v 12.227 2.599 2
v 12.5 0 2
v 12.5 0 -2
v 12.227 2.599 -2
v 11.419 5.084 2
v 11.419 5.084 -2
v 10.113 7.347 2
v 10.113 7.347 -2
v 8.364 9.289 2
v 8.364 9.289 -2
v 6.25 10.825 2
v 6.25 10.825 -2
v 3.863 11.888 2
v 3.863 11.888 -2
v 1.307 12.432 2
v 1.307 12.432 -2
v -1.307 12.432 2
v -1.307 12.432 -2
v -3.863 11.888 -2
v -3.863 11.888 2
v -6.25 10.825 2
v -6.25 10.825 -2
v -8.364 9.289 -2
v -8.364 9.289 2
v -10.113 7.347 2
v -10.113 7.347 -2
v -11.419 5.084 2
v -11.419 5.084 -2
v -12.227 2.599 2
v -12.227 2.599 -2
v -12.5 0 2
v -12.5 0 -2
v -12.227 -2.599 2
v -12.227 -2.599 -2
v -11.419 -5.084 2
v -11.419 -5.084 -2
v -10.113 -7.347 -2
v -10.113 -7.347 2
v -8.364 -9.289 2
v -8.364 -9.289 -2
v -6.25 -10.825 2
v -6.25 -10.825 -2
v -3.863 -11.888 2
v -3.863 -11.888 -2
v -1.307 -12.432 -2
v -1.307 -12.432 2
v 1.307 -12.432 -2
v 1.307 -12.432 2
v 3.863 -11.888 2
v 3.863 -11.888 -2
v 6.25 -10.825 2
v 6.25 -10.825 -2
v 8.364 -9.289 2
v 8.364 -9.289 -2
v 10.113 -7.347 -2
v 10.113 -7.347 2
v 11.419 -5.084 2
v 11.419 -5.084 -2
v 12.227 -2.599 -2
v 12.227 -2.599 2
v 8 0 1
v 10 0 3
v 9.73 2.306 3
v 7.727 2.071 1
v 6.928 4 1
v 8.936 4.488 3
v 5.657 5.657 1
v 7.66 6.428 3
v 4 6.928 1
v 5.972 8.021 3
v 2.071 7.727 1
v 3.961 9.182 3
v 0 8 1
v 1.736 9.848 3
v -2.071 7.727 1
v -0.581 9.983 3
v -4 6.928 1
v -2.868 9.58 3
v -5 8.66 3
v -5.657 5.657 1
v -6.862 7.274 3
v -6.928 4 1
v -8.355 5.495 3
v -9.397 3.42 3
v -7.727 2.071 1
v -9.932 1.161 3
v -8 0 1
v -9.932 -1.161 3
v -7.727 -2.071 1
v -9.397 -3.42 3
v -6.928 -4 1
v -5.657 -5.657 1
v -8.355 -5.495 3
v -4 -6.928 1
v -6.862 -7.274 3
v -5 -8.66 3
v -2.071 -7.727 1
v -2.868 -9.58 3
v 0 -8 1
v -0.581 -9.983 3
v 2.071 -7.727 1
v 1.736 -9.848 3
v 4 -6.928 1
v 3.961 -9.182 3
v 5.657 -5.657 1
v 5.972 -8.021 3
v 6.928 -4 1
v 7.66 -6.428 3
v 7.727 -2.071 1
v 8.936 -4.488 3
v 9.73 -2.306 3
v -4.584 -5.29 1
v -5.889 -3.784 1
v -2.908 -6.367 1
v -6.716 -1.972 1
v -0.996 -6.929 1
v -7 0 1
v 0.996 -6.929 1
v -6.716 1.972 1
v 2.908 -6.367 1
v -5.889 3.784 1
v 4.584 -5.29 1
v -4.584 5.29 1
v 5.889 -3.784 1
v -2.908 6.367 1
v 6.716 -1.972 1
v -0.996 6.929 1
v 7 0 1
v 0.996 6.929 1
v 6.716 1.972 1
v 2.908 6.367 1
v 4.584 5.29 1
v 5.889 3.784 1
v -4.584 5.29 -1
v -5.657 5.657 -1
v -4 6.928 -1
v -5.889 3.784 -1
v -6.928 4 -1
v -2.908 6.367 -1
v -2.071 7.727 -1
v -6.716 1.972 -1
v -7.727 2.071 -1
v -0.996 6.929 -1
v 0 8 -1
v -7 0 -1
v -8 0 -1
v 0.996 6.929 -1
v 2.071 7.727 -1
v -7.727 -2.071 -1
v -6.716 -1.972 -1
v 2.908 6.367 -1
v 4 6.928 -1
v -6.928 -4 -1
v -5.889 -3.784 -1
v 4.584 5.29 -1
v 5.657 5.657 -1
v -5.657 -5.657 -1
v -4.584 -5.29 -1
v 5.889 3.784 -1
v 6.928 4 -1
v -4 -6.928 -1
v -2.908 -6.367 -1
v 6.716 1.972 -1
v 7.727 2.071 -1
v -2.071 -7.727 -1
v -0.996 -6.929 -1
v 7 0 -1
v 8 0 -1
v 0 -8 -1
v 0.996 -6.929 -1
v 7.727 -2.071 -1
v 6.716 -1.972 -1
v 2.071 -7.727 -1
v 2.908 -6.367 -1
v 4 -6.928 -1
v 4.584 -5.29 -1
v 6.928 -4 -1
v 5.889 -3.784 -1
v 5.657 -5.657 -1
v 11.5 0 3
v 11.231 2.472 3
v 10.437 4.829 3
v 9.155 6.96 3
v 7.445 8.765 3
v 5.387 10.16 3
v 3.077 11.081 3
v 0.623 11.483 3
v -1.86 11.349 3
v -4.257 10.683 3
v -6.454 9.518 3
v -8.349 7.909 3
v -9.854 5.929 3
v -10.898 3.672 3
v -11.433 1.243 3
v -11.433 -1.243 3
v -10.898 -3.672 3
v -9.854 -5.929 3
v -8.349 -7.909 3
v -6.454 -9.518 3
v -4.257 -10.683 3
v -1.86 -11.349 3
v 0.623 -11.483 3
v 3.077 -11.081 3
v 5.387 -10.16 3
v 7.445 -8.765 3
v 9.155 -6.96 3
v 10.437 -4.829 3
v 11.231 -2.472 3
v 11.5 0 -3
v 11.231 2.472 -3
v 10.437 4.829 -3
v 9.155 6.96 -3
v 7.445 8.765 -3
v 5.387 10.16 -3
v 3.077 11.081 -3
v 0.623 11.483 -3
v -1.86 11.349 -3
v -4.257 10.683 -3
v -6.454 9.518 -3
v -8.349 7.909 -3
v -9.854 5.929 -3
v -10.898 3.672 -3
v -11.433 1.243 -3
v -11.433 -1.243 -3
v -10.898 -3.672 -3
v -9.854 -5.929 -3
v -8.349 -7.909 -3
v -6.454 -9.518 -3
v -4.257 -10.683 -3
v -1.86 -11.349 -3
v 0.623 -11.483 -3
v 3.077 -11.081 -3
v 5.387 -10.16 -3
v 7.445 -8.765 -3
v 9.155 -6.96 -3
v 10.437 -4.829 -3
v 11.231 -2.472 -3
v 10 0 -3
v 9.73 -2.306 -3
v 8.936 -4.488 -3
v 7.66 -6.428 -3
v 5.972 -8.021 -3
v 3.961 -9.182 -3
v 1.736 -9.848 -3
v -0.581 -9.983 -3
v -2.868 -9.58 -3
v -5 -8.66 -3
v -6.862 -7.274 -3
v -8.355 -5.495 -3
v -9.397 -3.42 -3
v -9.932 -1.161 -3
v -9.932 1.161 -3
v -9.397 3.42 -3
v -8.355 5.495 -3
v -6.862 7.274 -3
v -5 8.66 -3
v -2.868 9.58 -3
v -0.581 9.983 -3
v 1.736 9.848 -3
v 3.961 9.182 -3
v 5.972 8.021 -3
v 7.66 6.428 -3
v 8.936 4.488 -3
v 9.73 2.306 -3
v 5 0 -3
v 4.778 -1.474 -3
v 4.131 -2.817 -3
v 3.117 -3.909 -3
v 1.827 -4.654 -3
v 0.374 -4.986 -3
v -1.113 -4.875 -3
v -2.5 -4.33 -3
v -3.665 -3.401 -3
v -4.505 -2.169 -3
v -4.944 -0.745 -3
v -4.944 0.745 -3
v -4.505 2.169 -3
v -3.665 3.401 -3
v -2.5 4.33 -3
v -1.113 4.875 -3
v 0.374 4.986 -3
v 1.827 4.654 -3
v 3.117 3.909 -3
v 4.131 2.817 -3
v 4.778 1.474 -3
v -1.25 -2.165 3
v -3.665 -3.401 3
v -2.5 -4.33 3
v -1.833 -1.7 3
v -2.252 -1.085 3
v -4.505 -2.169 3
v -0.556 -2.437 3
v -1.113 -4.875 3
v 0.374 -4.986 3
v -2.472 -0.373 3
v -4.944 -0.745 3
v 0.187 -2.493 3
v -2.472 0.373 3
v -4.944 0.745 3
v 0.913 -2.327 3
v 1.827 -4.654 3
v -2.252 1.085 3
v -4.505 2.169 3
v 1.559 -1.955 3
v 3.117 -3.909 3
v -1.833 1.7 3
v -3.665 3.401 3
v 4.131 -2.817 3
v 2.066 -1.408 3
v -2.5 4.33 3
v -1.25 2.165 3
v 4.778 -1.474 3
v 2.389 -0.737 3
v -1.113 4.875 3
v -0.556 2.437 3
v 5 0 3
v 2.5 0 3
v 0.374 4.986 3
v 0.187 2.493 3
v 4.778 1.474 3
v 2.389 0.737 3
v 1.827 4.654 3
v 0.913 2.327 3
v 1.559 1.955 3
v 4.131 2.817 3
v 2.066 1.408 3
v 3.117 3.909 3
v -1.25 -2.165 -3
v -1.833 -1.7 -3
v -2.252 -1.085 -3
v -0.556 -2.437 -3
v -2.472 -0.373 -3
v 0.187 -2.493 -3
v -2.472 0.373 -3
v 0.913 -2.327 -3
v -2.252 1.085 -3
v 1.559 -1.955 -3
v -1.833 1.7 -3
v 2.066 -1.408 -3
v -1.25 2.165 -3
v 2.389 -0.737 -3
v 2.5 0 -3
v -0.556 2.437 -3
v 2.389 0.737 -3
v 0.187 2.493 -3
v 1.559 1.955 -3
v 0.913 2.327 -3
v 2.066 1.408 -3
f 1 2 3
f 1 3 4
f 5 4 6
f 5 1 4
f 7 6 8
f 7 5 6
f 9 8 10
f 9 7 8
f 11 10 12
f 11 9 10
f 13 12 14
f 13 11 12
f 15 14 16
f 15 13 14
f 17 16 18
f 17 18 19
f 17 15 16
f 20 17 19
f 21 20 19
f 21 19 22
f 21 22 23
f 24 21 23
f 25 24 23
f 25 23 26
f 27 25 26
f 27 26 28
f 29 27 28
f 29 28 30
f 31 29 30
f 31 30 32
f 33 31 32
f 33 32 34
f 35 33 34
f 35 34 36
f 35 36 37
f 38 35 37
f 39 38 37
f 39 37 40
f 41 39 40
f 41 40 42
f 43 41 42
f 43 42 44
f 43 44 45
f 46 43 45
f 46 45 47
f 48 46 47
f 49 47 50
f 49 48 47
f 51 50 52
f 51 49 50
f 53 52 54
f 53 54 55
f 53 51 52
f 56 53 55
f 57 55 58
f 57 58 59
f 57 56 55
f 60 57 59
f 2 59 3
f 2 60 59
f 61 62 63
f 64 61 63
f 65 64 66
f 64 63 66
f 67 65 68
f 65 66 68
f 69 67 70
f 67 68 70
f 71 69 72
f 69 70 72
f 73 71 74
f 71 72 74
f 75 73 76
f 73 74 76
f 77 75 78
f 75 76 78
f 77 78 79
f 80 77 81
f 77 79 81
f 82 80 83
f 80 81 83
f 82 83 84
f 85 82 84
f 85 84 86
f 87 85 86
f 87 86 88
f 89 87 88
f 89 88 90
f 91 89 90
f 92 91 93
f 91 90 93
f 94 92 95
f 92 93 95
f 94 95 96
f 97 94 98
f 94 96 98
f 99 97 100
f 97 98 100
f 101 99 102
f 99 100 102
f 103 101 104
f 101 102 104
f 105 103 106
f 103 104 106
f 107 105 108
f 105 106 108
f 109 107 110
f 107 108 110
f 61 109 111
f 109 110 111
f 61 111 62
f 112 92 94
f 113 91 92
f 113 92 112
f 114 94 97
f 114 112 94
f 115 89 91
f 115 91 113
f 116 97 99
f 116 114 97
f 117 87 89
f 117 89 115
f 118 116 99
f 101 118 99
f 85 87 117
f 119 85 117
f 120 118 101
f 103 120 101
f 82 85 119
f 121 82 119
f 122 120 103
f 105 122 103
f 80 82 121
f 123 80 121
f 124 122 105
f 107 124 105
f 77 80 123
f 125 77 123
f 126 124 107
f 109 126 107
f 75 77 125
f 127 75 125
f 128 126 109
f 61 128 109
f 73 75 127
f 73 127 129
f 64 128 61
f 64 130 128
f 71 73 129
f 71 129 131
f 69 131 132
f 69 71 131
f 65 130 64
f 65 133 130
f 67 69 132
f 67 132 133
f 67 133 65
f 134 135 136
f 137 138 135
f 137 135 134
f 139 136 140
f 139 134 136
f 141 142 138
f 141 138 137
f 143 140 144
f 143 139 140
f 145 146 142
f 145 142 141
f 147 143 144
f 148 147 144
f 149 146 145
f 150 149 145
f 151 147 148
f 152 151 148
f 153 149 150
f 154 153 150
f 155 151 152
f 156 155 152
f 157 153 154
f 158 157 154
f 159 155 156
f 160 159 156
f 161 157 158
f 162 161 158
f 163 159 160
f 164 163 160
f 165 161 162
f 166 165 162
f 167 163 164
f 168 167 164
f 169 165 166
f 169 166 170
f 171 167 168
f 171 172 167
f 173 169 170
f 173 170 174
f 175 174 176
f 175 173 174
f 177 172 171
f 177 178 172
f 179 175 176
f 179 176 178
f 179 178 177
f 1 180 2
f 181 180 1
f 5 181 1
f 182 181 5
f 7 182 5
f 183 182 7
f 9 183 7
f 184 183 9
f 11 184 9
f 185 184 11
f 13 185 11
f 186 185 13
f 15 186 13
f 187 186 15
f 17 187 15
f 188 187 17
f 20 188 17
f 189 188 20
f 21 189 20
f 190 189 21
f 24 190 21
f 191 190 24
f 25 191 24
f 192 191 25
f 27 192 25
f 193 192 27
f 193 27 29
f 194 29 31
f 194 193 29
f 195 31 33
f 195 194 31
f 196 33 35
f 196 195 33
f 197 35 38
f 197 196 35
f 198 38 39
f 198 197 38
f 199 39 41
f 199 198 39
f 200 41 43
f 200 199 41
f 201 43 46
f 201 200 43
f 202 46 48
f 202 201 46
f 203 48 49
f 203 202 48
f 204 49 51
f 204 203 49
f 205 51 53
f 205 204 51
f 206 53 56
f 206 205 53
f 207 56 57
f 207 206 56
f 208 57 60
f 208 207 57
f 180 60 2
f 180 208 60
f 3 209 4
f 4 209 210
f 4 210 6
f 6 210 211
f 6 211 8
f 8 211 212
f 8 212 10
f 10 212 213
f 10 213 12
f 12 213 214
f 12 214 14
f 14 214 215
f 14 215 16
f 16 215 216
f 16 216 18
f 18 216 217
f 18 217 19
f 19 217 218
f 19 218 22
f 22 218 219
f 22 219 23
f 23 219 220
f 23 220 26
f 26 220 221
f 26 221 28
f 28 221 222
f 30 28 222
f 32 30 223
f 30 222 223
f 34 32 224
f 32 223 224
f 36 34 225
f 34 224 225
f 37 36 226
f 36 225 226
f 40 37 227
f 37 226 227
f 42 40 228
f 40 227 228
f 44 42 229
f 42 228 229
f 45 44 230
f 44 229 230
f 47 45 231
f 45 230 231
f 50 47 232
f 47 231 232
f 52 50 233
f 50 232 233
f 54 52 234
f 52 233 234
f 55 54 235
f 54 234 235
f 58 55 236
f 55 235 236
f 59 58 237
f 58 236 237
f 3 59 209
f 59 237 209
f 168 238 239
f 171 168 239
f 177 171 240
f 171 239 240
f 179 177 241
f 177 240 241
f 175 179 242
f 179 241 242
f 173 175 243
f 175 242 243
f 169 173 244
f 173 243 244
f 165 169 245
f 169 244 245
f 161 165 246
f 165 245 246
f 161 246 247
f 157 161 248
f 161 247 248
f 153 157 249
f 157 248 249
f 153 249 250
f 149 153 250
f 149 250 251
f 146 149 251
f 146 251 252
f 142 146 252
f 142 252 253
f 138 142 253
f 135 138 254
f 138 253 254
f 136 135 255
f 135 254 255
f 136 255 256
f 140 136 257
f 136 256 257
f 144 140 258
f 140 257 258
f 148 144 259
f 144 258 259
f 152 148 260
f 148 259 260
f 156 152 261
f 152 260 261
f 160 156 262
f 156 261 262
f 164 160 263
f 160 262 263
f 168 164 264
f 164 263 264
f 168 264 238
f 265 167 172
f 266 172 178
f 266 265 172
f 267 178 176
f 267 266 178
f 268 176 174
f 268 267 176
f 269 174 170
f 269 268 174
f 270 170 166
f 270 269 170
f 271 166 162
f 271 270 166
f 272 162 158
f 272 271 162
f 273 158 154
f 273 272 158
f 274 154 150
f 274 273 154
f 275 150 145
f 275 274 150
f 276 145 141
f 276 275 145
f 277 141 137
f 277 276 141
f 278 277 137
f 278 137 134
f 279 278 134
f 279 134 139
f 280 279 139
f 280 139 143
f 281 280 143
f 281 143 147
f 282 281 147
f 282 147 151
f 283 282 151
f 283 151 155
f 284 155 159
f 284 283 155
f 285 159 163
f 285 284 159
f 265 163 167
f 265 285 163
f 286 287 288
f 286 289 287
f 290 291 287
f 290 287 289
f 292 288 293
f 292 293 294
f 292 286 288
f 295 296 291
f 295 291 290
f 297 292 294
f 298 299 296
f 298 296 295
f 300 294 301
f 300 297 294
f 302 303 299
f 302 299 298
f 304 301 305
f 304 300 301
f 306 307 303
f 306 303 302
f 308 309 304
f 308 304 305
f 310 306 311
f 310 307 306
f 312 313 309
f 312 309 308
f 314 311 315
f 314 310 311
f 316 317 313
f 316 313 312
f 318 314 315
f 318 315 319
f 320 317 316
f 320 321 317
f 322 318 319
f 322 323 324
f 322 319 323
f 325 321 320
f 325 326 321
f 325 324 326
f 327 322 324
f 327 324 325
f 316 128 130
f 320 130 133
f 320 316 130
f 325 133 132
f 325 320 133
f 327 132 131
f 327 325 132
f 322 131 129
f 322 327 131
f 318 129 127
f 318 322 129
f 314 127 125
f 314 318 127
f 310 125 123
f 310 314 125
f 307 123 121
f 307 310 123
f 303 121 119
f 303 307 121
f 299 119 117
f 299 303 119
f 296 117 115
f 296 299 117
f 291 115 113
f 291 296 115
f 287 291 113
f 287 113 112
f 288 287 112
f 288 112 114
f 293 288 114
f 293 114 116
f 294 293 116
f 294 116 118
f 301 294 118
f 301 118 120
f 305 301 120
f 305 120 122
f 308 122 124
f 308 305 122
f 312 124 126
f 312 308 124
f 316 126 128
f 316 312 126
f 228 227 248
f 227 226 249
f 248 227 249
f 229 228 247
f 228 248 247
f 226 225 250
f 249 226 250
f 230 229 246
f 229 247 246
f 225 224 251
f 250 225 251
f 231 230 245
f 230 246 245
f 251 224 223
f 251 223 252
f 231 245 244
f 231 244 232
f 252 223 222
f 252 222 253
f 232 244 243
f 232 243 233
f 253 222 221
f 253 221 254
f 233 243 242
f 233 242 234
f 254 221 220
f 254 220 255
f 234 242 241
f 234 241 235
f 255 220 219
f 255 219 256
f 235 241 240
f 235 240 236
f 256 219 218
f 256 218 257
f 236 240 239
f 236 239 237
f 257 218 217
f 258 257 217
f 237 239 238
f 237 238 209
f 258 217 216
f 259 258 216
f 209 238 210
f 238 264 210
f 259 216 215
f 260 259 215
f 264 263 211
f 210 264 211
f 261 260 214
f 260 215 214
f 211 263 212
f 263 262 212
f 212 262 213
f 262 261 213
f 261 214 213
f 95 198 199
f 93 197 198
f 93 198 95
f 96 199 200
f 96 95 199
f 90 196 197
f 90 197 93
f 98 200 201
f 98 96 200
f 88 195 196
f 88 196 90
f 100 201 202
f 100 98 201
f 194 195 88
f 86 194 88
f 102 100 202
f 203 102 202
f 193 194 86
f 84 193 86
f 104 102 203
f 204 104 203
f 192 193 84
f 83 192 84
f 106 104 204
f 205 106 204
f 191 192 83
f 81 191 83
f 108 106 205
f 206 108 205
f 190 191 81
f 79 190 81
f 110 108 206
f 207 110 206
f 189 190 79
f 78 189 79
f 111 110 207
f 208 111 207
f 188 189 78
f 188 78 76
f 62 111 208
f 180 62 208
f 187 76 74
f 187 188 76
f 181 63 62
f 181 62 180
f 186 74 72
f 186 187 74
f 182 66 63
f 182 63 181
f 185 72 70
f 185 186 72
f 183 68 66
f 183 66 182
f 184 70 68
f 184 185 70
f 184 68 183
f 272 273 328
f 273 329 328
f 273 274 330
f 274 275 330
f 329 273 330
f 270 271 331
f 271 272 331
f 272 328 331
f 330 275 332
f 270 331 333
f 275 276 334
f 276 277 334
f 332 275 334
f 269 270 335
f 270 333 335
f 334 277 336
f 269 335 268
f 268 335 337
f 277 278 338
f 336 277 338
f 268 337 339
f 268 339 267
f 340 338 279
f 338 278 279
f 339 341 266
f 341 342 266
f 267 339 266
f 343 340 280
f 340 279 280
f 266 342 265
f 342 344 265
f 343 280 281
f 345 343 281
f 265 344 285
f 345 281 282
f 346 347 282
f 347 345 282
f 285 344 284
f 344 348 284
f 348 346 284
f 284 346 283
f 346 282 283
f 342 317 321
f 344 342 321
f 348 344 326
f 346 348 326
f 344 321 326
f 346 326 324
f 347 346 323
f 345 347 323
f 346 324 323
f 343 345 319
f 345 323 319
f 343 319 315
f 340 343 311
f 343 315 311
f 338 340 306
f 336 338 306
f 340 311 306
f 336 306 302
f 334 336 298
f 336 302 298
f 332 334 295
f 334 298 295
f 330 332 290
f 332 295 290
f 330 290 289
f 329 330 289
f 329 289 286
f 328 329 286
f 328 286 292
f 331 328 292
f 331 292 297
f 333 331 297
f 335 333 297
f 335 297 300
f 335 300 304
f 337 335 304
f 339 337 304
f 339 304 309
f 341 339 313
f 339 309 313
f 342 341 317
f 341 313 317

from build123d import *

# Parameters (mm, degrees)
SKETCH2_R                 = 12.5
BOSS_EXTRUDE1_DEPTH       = 3
SKETCH3_R                 = 2.5
CUT_EXTRUDE1_DEPTH        = 6
SKETCH4_R                 = 10
SKETCH4_R_2               = 5
CUT_EXTRUDE2_DEPTH        = 2
CUT_EXTRUDE2_DRAFT        = -45
MIRROR1_COPY_1_SKETCH_R   = 10
MIRROR1_COPY_1_SKETCH_R_2 = 5
MIRROR1_COPY_1_DEPTH      = 2
MIRROR1_COPY_1_DRAFT      = -45
CHAMFER1_SIZE             = 1


with BuildPart() as part:
    # Sketch2 → Boss-Extrude1 (new, symmetric)
    with BuildSketch(Plane.XY):
        Circle(SKETCH2_R)
    extrude(amount=BOSS_EXTRUDE1_DEPTH, both=True)

    # Sketch3 → Cut-Extrude1 (cut)
    with BuildSketch(Plane.XY.offset(3)):
        Circle(SKETCH3_R)
    extrude(amount=-CUT_EXTRUDE1_DEPTH, mode=Mode.SUBTRACT)


with BuildPart() as cut_extrude2_tool:
    # Sketch4 → Cut-Extrude2 (with draft: the straight prism first)
    with BuildSketch(Plane.XY.offset(3)):
        Circle(SKETCH4_R)
        Circle(SKETCH4_R_2, mode=Mode.SUBTRACT)
    extrude(amount=-CUT_EXTRUDE2_DEPTH)
    # Cut-Extrude2: the draft: its side faces are tilted about the plane it starts from
    cut_extrude2_sides = [cut_extrude2_tool.faces().sort_by_distance(p)[0] for p in [
        (-10, 0, 2),
        (-5, 0, 2),
    ]]
    draft(cut_extrude2_sides, Plane.XY.offset(3), CUT_EXTRUDE2_DRAFT)


with BuildPart() as part_1:
    add(part.part)

    # Cut-Extrude2: cut by cut_extrude2_tool
    add(cut_extrude2_tool.part, mode=Mode.SUBTRACT)


with BuildPart() as mirror1_copy_1_tool:
    # Mirror1 copy 1 sketch → Mirror1 copy 1 (with draft: the straight prism first)
    with BuildSketch(Plane(origin=(0, 0, -3), x_dir=(1, 0, 0), z_dir=(0, 0, -1))):
        Circle(MIRROR1_COPY_1_SKETCH_R)
        Circle(MIRROR1_COPY_1_SKETCH_R_2, mode=Mode.SUBTRACT)
    extrude(amount=-MIRROR1_COPY_1_DEPTH)
    # Mirror1 copy 1: the draft: its side faces are tilted about the plane it starts from
    mirror1_copy_1_sides = [mirror1_copy_1_tool.faces().sort_by_distance(p)[0] for p in [
        (-10, 0, -2),
        (-5, 0, -2),
    ]]
    draft(mirror1_copy_1_sides, Plane(origin=(0, 0, -3), x_dir=(1, 0, 0), z_dir=(0, 0, -1)), MIRROR1_COPY_1_DRAFT)


with BuildPart() as part_2:
    add(part_1.part)

    # Mirror1 copy 1: cut by mirror1_copy_1_tool
    add(mirror1_copy_1_tool.part, mode=Mode.SUBTRACT)

    # Chamfer1
    chamfer1_edges = [part_2.edges().sort_by_distance(p)[0] for p in [
        (-12.5, 0, -3),
        (-12.5, 0, 3),
    ]]
    chamfer(chamfer1_edges, length=CHAMFER1_SIZE)


solid = part_2.part
